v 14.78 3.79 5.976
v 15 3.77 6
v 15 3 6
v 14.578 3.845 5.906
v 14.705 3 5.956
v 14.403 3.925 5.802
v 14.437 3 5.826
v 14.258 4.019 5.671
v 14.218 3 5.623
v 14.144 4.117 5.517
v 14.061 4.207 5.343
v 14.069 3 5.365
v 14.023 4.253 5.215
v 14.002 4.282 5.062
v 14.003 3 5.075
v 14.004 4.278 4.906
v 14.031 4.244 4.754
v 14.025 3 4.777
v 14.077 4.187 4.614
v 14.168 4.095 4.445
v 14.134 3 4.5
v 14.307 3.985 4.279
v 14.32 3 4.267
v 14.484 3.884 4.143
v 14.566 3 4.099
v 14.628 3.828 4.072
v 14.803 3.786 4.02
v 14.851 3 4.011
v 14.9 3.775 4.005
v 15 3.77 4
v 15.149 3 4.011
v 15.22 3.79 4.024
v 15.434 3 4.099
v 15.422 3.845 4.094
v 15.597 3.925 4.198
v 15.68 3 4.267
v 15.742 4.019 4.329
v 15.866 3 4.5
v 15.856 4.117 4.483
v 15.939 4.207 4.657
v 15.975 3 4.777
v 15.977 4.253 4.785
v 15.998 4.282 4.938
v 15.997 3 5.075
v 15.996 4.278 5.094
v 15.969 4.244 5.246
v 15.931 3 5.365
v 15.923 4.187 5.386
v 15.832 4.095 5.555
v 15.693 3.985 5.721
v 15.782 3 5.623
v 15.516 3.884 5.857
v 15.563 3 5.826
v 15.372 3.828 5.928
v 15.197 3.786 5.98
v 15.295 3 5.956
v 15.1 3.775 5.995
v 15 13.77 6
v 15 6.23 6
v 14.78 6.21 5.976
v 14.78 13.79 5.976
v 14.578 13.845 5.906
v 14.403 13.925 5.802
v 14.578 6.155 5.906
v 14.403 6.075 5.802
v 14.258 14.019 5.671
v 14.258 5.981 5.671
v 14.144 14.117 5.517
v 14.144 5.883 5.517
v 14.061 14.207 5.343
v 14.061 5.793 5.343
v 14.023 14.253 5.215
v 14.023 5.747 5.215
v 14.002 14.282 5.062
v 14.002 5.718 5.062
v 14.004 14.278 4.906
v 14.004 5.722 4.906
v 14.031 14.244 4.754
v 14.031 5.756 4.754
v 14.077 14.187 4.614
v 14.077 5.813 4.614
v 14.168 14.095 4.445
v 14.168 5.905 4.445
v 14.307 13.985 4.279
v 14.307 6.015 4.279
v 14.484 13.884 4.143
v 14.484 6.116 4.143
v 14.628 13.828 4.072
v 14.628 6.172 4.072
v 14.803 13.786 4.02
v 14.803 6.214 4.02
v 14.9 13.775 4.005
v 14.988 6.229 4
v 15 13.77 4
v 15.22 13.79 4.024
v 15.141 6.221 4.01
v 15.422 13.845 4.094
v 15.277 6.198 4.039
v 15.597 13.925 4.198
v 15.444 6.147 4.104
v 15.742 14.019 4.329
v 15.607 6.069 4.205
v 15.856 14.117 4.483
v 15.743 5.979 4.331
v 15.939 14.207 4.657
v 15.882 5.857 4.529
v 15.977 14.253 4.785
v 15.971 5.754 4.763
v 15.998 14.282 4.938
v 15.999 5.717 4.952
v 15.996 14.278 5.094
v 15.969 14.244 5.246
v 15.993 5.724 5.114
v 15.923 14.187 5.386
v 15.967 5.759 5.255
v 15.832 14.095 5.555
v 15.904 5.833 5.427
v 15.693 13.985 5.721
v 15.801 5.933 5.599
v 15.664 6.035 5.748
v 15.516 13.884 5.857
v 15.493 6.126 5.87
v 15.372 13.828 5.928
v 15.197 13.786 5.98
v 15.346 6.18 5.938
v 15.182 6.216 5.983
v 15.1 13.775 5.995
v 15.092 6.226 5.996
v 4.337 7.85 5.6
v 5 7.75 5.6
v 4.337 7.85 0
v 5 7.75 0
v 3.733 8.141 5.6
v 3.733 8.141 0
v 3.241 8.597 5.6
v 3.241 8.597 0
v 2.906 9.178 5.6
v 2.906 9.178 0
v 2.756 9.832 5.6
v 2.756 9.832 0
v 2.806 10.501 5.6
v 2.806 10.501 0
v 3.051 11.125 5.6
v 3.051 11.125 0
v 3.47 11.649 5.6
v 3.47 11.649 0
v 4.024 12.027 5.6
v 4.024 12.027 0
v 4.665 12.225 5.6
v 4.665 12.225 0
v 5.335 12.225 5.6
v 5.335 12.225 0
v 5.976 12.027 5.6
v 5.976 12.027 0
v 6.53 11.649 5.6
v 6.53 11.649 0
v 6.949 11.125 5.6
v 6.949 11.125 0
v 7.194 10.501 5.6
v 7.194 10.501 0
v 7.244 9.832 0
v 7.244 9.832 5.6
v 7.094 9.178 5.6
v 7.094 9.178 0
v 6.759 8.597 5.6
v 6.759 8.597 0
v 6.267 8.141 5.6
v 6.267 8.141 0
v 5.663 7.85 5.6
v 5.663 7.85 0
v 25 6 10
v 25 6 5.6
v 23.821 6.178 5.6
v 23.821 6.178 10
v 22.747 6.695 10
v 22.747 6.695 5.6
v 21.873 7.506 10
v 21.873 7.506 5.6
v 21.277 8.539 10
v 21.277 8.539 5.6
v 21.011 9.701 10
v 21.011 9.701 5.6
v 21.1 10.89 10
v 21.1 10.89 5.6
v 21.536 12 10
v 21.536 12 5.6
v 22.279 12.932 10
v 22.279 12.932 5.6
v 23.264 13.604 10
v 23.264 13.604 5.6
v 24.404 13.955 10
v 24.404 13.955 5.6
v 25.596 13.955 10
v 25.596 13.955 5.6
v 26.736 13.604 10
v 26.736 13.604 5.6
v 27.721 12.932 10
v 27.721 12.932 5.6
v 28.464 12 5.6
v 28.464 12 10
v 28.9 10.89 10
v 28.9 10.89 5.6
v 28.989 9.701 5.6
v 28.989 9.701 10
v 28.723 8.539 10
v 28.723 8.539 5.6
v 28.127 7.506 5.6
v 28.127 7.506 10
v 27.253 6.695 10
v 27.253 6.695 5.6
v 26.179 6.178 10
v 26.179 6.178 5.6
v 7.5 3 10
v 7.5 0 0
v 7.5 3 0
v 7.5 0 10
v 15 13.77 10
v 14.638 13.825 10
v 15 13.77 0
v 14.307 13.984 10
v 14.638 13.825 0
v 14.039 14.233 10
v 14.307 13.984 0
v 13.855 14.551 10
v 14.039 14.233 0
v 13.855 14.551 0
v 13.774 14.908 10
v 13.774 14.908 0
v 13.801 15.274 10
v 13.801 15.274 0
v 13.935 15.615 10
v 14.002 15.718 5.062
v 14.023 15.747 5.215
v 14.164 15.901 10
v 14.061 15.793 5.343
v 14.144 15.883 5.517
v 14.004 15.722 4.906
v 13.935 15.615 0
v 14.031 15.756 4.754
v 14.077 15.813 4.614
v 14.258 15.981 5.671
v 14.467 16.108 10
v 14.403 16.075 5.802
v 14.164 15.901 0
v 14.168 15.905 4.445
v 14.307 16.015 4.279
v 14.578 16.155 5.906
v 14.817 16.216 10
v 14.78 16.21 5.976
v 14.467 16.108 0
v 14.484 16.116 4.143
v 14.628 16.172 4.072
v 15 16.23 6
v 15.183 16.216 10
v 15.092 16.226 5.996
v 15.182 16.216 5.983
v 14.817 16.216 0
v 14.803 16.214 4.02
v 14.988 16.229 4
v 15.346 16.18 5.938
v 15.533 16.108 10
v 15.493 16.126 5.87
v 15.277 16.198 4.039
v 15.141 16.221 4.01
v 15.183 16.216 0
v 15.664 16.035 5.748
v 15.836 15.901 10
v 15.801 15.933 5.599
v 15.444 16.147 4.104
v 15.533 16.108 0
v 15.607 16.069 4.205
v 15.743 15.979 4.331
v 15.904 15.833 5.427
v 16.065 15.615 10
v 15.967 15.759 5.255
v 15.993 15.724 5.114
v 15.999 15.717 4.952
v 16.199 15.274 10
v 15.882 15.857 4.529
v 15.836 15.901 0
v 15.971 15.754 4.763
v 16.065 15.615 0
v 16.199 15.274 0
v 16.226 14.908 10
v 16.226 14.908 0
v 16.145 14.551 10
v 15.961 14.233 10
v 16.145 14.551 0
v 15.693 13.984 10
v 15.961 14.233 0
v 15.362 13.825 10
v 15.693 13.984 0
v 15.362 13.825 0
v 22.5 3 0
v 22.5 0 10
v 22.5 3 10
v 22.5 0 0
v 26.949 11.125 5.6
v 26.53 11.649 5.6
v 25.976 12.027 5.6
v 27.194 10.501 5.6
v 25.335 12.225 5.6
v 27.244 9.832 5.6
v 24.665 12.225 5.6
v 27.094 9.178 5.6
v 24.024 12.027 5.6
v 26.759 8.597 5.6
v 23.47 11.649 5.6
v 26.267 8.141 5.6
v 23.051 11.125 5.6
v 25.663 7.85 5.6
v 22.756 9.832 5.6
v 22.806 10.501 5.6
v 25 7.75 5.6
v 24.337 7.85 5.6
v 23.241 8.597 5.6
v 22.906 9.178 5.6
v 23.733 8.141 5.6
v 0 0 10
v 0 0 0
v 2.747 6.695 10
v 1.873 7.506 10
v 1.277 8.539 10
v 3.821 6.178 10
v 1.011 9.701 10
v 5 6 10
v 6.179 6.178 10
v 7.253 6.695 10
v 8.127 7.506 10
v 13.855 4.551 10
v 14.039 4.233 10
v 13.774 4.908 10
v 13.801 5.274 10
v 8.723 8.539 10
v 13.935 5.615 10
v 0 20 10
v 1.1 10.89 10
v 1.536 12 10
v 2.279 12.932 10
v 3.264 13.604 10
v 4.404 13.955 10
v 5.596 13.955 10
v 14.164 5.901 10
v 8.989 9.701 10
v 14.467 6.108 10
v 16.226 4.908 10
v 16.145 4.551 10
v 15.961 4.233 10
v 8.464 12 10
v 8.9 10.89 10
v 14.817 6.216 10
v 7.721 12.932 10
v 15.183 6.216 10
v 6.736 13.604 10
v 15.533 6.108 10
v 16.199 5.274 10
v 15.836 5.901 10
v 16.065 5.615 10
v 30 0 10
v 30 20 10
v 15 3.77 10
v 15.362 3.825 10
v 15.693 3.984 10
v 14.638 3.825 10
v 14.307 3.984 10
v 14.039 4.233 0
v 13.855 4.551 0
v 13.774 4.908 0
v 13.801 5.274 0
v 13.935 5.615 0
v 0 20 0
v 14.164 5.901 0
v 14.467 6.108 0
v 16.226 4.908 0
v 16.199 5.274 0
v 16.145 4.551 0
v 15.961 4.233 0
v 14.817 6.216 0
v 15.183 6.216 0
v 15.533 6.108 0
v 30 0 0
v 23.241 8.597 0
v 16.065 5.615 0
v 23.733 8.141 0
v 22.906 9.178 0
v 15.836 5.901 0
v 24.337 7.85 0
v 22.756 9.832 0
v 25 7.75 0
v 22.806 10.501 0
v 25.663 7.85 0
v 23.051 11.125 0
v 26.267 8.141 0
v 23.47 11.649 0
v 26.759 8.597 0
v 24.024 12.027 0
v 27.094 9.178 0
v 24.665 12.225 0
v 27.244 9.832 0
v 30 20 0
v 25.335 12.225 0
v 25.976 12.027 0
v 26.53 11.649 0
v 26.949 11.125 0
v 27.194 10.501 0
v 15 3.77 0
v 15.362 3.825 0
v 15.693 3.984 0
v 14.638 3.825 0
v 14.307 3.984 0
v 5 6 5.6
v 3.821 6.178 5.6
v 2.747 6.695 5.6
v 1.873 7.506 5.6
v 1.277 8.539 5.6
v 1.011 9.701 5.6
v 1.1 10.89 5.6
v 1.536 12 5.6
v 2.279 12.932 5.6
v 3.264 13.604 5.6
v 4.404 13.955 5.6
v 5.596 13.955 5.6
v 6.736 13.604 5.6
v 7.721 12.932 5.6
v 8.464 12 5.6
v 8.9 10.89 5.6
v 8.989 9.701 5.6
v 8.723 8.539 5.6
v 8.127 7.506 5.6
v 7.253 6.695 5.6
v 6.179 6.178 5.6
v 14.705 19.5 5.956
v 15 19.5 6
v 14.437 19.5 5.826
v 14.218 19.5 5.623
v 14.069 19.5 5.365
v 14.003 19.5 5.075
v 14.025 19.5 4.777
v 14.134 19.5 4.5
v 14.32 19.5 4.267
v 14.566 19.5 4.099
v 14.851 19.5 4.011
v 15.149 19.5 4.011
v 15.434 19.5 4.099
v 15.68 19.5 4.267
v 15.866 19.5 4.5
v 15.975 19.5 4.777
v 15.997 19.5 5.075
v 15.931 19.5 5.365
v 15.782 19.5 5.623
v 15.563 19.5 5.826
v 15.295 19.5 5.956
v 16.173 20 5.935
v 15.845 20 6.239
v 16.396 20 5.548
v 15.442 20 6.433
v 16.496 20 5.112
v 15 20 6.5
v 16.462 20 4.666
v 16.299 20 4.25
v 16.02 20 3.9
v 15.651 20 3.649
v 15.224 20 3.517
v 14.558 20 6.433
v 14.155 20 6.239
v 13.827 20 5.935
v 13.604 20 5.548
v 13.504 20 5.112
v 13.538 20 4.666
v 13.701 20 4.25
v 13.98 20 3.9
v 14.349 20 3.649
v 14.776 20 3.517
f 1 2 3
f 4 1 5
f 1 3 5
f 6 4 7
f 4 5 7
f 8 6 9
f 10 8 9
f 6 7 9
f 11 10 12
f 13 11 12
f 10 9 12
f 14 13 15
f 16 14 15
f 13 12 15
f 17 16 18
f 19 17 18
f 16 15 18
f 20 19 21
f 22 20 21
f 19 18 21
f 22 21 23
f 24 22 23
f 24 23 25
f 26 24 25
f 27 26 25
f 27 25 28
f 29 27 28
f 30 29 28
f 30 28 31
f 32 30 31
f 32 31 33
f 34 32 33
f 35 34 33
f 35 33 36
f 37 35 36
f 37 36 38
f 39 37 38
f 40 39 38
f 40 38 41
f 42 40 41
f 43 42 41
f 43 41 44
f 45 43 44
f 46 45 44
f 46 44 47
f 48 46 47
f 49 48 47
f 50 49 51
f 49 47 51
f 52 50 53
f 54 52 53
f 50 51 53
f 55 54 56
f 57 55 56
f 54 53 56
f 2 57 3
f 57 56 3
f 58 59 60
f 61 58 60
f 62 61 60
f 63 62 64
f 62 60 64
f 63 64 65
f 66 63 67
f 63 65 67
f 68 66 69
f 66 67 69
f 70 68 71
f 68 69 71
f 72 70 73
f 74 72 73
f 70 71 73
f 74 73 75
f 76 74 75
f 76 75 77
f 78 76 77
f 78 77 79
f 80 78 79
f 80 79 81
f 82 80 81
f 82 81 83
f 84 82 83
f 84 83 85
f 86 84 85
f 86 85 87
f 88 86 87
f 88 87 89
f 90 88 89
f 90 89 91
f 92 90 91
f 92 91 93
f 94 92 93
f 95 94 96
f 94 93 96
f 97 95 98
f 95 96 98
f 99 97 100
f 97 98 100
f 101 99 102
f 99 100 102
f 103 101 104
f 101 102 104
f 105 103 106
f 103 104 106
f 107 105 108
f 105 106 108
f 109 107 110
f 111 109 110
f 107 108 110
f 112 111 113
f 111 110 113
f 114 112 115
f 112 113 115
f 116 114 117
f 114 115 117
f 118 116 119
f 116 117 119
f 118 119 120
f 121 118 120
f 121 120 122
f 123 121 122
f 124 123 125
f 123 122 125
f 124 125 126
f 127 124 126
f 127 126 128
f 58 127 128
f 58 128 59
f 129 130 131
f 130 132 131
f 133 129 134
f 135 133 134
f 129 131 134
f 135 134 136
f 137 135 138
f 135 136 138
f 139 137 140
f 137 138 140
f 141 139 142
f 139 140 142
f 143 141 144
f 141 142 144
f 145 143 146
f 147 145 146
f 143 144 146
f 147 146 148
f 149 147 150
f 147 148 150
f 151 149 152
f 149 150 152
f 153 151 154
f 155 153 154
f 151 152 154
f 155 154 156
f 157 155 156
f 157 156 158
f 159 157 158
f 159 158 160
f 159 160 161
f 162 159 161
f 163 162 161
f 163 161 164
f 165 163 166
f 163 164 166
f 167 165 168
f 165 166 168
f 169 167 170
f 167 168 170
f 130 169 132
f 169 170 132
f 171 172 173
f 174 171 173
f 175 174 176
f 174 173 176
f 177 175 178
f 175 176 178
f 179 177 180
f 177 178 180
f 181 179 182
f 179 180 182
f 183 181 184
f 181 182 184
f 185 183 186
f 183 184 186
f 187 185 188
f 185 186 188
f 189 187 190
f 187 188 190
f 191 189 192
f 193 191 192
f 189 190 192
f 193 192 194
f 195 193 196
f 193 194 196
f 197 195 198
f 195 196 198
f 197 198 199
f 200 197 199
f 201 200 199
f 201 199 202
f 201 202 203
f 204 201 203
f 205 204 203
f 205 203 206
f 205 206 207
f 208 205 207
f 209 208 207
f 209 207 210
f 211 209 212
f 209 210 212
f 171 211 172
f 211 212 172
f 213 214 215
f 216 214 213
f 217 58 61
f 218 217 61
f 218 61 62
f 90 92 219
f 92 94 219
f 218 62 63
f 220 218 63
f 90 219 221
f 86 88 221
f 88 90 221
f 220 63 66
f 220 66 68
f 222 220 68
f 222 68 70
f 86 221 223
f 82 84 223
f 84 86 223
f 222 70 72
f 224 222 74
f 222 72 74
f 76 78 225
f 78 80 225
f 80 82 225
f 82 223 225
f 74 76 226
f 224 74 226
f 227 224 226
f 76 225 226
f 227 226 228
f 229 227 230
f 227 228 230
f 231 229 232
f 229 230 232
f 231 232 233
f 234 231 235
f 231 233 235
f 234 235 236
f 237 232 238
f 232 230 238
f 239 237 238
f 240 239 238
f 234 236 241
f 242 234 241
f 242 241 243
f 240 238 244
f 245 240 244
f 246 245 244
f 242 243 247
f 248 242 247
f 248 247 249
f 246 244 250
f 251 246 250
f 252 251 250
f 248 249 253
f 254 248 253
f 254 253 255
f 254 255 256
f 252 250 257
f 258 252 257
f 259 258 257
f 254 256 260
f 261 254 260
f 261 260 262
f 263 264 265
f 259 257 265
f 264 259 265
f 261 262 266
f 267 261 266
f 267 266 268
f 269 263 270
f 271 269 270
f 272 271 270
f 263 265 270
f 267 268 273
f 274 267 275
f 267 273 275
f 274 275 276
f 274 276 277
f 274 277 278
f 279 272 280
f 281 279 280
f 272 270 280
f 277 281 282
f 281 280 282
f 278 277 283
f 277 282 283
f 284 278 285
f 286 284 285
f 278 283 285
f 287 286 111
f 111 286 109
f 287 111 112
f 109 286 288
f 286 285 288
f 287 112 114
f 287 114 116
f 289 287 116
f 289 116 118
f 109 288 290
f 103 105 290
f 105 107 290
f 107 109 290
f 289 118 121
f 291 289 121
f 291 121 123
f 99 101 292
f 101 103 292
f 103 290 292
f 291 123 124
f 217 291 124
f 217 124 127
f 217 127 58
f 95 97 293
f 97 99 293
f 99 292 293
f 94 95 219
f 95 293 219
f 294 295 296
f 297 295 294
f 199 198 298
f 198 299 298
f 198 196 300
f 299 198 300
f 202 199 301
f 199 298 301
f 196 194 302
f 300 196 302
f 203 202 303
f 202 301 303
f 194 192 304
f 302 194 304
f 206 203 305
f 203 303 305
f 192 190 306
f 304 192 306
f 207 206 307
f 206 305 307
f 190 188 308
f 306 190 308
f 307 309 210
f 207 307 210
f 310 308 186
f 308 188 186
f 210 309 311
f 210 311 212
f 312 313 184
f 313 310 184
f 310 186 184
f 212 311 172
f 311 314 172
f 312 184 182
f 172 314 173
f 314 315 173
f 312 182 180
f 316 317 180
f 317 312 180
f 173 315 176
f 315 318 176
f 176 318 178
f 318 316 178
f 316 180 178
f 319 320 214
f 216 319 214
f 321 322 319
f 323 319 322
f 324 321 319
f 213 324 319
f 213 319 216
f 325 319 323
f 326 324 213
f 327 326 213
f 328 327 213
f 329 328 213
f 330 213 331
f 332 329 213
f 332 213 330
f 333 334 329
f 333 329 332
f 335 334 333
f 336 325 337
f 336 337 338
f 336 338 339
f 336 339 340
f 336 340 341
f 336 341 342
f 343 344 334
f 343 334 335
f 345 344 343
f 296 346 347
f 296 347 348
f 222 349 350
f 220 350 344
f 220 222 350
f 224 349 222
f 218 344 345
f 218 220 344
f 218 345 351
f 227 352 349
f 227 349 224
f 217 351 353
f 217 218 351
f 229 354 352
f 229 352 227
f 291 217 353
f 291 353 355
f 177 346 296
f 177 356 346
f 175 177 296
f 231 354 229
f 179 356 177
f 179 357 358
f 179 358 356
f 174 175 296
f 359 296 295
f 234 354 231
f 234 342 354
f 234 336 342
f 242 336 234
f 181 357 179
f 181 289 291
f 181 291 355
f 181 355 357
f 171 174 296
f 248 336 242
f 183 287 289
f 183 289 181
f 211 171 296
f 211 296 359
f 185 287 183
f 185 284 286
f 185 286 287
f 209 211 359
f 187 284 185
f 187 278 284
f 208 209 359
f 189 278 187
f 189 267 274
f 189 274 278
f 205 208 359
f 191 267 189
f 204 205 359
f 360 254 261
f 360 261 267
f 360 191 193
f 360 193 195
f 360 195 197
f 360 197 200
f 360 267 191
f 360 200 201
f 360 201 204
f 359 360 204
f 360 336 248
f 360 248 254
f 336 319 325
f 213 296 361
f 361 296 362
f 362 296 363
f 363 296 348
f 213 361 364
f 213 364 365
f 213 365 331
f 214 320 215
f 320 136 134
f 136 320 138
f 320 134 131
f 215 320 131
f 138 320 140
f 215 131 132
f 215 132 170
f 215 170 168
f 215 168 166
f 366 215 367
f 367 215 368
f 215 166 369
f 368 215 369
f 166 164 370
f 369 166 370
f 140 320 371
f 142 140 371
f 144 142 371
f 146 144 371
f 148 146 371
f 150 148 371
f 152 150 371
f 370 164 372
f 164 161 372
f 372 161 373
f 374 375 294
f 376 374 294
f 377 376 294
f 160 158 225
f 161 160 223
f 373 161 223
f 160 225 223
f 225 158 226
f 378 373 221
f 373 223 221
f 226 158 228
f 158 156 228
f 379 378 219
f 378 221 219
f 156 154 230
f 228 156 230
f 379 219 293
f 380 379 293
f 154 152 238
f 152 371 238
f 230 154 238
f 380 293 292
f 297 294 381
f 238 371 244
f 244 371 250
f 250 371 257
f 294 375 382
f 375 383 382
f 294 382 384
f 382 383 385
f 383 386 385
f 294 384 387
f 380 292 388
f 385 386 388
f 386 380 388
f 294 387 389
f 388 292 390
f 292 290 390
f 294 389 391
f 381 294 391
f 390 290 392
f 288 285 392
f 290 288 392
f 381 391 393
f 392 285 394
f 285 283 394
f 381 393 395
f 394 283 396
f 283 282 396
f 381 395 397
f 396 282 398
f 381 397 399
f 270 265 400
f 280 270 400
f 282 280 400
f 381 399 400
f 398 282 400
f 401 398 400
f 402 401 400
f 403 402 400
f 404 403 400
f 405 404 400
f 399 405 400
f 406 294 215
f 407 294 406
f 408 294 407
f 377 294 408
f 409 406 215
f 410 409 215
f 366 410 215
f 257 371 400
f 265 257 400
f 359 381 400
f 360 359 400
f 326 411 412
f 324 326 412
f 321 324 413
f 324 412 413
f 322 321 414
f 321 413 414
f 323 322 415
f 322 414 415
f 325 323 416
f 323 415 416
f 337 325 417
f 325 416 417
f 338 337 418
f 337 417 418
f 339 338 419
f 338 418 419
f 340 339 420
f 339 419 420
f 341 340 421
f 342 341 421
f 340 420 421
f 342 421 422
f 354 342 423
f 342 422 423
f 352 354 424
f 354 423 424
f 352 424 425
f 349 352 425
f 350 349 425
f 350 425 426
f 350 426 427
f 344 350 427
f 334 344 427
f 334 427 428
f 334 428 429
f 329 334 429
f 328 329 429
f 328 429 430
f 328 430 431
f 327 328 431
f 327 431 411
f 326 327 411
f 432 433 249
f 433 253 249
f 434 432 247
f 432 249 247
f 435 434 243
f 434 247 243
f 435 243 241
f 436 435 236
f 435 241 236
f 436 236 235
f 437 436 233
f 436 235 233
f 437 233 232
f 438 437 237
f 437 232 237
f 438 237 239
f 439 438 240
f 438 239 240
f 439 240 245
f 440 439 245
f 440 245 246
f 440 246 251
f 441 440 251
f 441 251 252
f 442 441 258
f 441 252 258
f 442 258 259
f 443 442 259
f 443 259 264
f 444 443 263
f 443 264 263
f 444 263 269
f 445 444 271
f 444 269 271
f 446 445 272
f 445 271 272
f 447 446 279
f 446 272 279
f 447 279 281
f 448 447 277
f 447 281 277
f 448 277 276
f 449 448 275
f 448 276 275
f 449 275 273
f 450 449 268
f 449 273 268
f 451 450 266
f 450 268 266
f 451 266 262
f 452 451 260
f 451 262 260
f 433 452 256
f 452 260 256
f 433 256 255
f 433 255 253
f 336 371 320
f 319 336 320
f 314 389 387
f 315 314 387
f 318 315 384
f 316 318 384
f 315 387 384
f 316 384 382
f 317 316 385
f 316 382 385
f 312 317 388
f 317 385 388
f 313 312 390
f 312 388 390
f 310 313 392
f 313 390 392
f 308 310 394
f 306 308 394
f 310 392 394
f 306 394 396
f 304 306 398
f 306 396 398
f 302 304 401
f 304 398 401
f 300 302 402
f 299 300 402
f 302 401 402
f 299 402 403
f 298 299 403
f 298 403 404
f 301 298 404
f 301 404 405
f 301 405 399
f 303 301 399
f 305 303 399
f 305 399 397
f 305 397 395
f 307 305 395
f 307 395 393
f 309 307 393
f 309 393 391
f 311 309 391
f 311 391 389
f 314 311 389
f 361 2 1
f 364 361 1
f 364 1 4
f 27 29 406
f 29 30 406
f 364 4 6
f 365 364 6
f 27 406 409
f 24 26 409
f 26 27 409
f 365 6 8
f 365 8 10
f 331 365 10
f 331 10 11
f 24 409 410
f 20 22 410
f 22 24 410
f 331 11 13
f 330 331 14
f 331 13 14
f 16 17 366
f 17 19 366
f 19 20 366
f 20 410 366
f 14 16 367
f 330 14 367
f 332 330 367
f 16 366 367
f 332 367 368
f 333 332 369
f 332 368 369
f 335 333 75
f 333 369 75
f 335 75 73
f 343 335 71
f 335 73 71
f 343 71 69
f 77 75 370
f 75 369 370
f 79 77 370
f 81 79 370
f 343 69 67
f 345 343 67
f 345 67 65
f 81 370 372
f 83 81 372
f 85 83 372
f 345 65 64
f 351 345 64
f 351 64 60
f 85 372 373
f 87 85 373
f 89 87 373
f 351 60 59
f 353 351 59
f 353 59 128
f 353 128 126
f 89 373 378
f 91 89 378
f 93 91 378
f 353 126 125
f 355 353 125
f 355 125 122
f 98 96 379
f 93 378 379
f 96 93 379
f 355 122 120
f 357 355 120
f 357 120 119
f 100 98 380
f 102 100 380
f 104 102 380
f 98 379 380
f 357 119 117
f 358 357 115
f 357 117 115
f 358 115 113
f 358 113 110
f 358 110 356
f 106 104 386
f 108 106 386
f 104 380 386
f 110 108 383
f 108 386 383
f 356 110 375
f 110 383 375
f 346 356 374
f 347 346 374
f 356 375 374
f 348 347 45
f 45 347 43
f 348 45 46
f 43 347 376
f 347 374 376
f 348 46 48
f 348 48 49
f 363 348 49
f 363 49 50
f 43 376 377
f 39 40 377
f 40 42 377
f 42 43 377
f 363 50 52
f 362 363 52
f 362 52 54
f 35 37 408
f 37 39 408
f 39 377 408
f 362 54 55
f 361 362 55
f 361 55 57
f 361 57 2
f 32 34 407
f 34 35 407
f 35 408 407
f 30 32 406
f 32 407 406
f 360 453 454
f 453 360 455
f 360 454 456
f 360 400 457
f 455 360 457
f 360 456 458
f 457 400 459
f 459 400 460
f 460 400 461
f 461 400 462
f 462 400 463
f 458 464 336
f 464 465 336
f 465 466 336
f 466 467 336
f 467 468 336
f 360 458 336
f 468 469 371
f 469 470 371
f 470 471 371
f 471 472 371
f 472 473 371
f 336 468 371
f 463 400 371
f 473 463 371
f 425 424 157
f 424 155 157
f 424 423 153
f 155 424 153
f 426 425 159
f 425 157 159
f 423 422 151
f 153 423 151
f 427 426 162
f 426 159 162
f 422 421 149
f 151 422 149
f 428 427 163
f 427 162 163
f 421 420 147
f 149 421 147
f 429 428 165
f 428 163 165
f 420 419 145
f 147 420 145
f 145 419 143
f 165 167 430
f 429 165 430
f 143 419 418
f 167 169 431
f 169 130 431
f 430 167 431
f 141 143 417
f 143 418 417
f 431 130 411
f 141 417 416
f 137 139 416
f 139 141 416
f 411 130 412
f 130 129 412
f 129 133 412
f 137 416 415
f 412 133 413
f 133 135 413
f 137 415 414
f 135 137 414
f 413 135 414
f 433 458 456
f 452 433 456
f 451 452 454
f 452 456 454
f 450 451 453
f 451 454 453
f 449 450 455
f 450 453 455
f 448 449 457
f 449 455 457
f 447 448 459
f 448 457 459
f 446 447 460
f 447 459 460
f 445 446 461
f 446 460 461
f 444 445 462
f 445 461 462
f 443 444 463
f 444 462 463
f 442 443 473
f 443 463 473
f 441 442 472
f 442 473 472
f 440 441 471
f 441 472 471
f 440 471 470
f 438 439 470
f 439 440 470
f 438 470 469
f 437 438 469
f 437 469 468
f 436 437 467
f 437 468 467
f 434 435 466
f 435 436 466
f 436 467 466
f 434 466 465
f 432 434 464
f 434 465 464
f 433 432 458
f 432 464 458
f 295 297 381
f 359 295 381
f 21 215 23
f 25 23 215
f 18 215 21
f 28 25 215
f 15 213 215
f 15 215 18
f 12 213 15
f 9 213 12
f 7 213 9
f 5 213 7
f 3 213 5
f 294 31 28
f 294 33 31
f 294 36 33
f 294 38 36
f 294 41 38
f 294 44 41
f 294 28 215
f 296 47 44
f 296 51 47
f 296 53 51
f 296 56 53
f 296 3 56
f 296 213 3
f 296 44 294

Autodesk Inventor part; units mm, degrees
ref_plane "YZ Plane" through (0, 0, 0) normal (1, 0, 0) x (0, 1, 0)
ref_plane "XZ Plane" through (0, 0, 0) normal (0, 1, 0) x (-1, 0, 0)
ref_plane "XY Plane" through (0, 0, 0) normal (0, 0, 1) x (1, 0, 0)
sketch "Skizze1" plane through (0, 0, 0) normal (0, 0, 1) x (1, 0, 0)
  line L0 (0, 0) -> (30, 0)
  line L1 (30, 0) -> (30, 20)
  line L2 (30, 20) -> (0, 20)
  line L3 (0, 20) -> (0, 0)
  dimension "d0" = 20
  dimension "d1" = 30
extrude "Extrusion1" add sketch "Skizze1" along normal blind 10
sketch "Skizze2" plane through (0, 0, 10) normal (0, 0, 1) x (1, 0, 0)
  line L0 (0, 0) -> (0, 20) projected
  line L1 (30, 0) -> (0, 0) projected
  line L2 (30, 20) -> (30, 0) projected
  line L3 (0, 20) -> (30, 20) projected
  line L4 (0, 10) -> (30, 10)
  line L5 (15, 20) -> (15, 0)
  point P0 (5, 10)
  point P1 (25, 10)
  dimension "d4" = 20
hole "Bohrung1" at (5, 10, 10) at (25, 10, 10) direction (0, 0, -1) diameter 4.5 end through all counterbore diameter 8 counterbore depth 4.4
sketch "Skizze3" plane through (0, 0, 10) normal (0, 0, 1) x (1, 0, 0)
  circle A0 centre (25, 10) radius 4 projected
  circle A1 centre (5, 10) radius 4 projected
  line L0 (30, 0) -> (0, 0) projected
  line L1 (0, 20) -> (30, 20) projected
  line L2 (15, 20) -> (15, 0)
  line L3 (5, 10) -> (25, 10)
  point P0 (15, 15)
  point P1 (15, 5)
  dimension "d12" = 10
hole "Bohrung2" at (15, 15, 10) at (15, 5, 10) direction (0, 0, -1) diameter 2.459 end through all thread size "M3x0.5" class "6H" standard "ISO Metric profile"
sketch "Skizze4" plane through (0, 20, 0) normal (0, 1, 0) x (1, 0, 0)
  line L0 (0, -10) -> (30, -10) projected
  line L1 (30, 0) -> (0, 0) projected
  line L2 (15, 0) -> (15, -10)
  point P0 (15, -5)
  dimension "d20" = 5
hole "Bohrung3" at (15, 20, 5) direction (0, -1, 0) diameter 2 end through all
chamfer "Fase1" distance 0.5 angle 45 2 edges at (15, 20, 4) (15, 0, 4)
sketch "Skizze5" plane through (0, 0, 0) normal (0, -1, 0) x (1, 0, 0)
  line L0 (30, 10) -> (0, 10) projected
  line L1 (0, 0) -> (0, 10) projected
  line L2 (0, 0) -> (30, 0) projected
  line L3 (7.5, 10) -> (22.5, 10)
  line L4 (22.5, 10) -> (22.5, 0)
  line L5 (22.5, 0) -> (7.5, 0)
  line L6 (7.5, 0) -> (7.5, 10)
  line L7 (15, 10) -> (15, 0)
  dimension "d31" = 15
  dimension "d32" = 15
extrude "Extrusion2" cut sketch "Skizze5" against normal blind 3 contours L4 L2 L7 L0 | L7 L2 L6 L0
properties part number "13_0204_073"
